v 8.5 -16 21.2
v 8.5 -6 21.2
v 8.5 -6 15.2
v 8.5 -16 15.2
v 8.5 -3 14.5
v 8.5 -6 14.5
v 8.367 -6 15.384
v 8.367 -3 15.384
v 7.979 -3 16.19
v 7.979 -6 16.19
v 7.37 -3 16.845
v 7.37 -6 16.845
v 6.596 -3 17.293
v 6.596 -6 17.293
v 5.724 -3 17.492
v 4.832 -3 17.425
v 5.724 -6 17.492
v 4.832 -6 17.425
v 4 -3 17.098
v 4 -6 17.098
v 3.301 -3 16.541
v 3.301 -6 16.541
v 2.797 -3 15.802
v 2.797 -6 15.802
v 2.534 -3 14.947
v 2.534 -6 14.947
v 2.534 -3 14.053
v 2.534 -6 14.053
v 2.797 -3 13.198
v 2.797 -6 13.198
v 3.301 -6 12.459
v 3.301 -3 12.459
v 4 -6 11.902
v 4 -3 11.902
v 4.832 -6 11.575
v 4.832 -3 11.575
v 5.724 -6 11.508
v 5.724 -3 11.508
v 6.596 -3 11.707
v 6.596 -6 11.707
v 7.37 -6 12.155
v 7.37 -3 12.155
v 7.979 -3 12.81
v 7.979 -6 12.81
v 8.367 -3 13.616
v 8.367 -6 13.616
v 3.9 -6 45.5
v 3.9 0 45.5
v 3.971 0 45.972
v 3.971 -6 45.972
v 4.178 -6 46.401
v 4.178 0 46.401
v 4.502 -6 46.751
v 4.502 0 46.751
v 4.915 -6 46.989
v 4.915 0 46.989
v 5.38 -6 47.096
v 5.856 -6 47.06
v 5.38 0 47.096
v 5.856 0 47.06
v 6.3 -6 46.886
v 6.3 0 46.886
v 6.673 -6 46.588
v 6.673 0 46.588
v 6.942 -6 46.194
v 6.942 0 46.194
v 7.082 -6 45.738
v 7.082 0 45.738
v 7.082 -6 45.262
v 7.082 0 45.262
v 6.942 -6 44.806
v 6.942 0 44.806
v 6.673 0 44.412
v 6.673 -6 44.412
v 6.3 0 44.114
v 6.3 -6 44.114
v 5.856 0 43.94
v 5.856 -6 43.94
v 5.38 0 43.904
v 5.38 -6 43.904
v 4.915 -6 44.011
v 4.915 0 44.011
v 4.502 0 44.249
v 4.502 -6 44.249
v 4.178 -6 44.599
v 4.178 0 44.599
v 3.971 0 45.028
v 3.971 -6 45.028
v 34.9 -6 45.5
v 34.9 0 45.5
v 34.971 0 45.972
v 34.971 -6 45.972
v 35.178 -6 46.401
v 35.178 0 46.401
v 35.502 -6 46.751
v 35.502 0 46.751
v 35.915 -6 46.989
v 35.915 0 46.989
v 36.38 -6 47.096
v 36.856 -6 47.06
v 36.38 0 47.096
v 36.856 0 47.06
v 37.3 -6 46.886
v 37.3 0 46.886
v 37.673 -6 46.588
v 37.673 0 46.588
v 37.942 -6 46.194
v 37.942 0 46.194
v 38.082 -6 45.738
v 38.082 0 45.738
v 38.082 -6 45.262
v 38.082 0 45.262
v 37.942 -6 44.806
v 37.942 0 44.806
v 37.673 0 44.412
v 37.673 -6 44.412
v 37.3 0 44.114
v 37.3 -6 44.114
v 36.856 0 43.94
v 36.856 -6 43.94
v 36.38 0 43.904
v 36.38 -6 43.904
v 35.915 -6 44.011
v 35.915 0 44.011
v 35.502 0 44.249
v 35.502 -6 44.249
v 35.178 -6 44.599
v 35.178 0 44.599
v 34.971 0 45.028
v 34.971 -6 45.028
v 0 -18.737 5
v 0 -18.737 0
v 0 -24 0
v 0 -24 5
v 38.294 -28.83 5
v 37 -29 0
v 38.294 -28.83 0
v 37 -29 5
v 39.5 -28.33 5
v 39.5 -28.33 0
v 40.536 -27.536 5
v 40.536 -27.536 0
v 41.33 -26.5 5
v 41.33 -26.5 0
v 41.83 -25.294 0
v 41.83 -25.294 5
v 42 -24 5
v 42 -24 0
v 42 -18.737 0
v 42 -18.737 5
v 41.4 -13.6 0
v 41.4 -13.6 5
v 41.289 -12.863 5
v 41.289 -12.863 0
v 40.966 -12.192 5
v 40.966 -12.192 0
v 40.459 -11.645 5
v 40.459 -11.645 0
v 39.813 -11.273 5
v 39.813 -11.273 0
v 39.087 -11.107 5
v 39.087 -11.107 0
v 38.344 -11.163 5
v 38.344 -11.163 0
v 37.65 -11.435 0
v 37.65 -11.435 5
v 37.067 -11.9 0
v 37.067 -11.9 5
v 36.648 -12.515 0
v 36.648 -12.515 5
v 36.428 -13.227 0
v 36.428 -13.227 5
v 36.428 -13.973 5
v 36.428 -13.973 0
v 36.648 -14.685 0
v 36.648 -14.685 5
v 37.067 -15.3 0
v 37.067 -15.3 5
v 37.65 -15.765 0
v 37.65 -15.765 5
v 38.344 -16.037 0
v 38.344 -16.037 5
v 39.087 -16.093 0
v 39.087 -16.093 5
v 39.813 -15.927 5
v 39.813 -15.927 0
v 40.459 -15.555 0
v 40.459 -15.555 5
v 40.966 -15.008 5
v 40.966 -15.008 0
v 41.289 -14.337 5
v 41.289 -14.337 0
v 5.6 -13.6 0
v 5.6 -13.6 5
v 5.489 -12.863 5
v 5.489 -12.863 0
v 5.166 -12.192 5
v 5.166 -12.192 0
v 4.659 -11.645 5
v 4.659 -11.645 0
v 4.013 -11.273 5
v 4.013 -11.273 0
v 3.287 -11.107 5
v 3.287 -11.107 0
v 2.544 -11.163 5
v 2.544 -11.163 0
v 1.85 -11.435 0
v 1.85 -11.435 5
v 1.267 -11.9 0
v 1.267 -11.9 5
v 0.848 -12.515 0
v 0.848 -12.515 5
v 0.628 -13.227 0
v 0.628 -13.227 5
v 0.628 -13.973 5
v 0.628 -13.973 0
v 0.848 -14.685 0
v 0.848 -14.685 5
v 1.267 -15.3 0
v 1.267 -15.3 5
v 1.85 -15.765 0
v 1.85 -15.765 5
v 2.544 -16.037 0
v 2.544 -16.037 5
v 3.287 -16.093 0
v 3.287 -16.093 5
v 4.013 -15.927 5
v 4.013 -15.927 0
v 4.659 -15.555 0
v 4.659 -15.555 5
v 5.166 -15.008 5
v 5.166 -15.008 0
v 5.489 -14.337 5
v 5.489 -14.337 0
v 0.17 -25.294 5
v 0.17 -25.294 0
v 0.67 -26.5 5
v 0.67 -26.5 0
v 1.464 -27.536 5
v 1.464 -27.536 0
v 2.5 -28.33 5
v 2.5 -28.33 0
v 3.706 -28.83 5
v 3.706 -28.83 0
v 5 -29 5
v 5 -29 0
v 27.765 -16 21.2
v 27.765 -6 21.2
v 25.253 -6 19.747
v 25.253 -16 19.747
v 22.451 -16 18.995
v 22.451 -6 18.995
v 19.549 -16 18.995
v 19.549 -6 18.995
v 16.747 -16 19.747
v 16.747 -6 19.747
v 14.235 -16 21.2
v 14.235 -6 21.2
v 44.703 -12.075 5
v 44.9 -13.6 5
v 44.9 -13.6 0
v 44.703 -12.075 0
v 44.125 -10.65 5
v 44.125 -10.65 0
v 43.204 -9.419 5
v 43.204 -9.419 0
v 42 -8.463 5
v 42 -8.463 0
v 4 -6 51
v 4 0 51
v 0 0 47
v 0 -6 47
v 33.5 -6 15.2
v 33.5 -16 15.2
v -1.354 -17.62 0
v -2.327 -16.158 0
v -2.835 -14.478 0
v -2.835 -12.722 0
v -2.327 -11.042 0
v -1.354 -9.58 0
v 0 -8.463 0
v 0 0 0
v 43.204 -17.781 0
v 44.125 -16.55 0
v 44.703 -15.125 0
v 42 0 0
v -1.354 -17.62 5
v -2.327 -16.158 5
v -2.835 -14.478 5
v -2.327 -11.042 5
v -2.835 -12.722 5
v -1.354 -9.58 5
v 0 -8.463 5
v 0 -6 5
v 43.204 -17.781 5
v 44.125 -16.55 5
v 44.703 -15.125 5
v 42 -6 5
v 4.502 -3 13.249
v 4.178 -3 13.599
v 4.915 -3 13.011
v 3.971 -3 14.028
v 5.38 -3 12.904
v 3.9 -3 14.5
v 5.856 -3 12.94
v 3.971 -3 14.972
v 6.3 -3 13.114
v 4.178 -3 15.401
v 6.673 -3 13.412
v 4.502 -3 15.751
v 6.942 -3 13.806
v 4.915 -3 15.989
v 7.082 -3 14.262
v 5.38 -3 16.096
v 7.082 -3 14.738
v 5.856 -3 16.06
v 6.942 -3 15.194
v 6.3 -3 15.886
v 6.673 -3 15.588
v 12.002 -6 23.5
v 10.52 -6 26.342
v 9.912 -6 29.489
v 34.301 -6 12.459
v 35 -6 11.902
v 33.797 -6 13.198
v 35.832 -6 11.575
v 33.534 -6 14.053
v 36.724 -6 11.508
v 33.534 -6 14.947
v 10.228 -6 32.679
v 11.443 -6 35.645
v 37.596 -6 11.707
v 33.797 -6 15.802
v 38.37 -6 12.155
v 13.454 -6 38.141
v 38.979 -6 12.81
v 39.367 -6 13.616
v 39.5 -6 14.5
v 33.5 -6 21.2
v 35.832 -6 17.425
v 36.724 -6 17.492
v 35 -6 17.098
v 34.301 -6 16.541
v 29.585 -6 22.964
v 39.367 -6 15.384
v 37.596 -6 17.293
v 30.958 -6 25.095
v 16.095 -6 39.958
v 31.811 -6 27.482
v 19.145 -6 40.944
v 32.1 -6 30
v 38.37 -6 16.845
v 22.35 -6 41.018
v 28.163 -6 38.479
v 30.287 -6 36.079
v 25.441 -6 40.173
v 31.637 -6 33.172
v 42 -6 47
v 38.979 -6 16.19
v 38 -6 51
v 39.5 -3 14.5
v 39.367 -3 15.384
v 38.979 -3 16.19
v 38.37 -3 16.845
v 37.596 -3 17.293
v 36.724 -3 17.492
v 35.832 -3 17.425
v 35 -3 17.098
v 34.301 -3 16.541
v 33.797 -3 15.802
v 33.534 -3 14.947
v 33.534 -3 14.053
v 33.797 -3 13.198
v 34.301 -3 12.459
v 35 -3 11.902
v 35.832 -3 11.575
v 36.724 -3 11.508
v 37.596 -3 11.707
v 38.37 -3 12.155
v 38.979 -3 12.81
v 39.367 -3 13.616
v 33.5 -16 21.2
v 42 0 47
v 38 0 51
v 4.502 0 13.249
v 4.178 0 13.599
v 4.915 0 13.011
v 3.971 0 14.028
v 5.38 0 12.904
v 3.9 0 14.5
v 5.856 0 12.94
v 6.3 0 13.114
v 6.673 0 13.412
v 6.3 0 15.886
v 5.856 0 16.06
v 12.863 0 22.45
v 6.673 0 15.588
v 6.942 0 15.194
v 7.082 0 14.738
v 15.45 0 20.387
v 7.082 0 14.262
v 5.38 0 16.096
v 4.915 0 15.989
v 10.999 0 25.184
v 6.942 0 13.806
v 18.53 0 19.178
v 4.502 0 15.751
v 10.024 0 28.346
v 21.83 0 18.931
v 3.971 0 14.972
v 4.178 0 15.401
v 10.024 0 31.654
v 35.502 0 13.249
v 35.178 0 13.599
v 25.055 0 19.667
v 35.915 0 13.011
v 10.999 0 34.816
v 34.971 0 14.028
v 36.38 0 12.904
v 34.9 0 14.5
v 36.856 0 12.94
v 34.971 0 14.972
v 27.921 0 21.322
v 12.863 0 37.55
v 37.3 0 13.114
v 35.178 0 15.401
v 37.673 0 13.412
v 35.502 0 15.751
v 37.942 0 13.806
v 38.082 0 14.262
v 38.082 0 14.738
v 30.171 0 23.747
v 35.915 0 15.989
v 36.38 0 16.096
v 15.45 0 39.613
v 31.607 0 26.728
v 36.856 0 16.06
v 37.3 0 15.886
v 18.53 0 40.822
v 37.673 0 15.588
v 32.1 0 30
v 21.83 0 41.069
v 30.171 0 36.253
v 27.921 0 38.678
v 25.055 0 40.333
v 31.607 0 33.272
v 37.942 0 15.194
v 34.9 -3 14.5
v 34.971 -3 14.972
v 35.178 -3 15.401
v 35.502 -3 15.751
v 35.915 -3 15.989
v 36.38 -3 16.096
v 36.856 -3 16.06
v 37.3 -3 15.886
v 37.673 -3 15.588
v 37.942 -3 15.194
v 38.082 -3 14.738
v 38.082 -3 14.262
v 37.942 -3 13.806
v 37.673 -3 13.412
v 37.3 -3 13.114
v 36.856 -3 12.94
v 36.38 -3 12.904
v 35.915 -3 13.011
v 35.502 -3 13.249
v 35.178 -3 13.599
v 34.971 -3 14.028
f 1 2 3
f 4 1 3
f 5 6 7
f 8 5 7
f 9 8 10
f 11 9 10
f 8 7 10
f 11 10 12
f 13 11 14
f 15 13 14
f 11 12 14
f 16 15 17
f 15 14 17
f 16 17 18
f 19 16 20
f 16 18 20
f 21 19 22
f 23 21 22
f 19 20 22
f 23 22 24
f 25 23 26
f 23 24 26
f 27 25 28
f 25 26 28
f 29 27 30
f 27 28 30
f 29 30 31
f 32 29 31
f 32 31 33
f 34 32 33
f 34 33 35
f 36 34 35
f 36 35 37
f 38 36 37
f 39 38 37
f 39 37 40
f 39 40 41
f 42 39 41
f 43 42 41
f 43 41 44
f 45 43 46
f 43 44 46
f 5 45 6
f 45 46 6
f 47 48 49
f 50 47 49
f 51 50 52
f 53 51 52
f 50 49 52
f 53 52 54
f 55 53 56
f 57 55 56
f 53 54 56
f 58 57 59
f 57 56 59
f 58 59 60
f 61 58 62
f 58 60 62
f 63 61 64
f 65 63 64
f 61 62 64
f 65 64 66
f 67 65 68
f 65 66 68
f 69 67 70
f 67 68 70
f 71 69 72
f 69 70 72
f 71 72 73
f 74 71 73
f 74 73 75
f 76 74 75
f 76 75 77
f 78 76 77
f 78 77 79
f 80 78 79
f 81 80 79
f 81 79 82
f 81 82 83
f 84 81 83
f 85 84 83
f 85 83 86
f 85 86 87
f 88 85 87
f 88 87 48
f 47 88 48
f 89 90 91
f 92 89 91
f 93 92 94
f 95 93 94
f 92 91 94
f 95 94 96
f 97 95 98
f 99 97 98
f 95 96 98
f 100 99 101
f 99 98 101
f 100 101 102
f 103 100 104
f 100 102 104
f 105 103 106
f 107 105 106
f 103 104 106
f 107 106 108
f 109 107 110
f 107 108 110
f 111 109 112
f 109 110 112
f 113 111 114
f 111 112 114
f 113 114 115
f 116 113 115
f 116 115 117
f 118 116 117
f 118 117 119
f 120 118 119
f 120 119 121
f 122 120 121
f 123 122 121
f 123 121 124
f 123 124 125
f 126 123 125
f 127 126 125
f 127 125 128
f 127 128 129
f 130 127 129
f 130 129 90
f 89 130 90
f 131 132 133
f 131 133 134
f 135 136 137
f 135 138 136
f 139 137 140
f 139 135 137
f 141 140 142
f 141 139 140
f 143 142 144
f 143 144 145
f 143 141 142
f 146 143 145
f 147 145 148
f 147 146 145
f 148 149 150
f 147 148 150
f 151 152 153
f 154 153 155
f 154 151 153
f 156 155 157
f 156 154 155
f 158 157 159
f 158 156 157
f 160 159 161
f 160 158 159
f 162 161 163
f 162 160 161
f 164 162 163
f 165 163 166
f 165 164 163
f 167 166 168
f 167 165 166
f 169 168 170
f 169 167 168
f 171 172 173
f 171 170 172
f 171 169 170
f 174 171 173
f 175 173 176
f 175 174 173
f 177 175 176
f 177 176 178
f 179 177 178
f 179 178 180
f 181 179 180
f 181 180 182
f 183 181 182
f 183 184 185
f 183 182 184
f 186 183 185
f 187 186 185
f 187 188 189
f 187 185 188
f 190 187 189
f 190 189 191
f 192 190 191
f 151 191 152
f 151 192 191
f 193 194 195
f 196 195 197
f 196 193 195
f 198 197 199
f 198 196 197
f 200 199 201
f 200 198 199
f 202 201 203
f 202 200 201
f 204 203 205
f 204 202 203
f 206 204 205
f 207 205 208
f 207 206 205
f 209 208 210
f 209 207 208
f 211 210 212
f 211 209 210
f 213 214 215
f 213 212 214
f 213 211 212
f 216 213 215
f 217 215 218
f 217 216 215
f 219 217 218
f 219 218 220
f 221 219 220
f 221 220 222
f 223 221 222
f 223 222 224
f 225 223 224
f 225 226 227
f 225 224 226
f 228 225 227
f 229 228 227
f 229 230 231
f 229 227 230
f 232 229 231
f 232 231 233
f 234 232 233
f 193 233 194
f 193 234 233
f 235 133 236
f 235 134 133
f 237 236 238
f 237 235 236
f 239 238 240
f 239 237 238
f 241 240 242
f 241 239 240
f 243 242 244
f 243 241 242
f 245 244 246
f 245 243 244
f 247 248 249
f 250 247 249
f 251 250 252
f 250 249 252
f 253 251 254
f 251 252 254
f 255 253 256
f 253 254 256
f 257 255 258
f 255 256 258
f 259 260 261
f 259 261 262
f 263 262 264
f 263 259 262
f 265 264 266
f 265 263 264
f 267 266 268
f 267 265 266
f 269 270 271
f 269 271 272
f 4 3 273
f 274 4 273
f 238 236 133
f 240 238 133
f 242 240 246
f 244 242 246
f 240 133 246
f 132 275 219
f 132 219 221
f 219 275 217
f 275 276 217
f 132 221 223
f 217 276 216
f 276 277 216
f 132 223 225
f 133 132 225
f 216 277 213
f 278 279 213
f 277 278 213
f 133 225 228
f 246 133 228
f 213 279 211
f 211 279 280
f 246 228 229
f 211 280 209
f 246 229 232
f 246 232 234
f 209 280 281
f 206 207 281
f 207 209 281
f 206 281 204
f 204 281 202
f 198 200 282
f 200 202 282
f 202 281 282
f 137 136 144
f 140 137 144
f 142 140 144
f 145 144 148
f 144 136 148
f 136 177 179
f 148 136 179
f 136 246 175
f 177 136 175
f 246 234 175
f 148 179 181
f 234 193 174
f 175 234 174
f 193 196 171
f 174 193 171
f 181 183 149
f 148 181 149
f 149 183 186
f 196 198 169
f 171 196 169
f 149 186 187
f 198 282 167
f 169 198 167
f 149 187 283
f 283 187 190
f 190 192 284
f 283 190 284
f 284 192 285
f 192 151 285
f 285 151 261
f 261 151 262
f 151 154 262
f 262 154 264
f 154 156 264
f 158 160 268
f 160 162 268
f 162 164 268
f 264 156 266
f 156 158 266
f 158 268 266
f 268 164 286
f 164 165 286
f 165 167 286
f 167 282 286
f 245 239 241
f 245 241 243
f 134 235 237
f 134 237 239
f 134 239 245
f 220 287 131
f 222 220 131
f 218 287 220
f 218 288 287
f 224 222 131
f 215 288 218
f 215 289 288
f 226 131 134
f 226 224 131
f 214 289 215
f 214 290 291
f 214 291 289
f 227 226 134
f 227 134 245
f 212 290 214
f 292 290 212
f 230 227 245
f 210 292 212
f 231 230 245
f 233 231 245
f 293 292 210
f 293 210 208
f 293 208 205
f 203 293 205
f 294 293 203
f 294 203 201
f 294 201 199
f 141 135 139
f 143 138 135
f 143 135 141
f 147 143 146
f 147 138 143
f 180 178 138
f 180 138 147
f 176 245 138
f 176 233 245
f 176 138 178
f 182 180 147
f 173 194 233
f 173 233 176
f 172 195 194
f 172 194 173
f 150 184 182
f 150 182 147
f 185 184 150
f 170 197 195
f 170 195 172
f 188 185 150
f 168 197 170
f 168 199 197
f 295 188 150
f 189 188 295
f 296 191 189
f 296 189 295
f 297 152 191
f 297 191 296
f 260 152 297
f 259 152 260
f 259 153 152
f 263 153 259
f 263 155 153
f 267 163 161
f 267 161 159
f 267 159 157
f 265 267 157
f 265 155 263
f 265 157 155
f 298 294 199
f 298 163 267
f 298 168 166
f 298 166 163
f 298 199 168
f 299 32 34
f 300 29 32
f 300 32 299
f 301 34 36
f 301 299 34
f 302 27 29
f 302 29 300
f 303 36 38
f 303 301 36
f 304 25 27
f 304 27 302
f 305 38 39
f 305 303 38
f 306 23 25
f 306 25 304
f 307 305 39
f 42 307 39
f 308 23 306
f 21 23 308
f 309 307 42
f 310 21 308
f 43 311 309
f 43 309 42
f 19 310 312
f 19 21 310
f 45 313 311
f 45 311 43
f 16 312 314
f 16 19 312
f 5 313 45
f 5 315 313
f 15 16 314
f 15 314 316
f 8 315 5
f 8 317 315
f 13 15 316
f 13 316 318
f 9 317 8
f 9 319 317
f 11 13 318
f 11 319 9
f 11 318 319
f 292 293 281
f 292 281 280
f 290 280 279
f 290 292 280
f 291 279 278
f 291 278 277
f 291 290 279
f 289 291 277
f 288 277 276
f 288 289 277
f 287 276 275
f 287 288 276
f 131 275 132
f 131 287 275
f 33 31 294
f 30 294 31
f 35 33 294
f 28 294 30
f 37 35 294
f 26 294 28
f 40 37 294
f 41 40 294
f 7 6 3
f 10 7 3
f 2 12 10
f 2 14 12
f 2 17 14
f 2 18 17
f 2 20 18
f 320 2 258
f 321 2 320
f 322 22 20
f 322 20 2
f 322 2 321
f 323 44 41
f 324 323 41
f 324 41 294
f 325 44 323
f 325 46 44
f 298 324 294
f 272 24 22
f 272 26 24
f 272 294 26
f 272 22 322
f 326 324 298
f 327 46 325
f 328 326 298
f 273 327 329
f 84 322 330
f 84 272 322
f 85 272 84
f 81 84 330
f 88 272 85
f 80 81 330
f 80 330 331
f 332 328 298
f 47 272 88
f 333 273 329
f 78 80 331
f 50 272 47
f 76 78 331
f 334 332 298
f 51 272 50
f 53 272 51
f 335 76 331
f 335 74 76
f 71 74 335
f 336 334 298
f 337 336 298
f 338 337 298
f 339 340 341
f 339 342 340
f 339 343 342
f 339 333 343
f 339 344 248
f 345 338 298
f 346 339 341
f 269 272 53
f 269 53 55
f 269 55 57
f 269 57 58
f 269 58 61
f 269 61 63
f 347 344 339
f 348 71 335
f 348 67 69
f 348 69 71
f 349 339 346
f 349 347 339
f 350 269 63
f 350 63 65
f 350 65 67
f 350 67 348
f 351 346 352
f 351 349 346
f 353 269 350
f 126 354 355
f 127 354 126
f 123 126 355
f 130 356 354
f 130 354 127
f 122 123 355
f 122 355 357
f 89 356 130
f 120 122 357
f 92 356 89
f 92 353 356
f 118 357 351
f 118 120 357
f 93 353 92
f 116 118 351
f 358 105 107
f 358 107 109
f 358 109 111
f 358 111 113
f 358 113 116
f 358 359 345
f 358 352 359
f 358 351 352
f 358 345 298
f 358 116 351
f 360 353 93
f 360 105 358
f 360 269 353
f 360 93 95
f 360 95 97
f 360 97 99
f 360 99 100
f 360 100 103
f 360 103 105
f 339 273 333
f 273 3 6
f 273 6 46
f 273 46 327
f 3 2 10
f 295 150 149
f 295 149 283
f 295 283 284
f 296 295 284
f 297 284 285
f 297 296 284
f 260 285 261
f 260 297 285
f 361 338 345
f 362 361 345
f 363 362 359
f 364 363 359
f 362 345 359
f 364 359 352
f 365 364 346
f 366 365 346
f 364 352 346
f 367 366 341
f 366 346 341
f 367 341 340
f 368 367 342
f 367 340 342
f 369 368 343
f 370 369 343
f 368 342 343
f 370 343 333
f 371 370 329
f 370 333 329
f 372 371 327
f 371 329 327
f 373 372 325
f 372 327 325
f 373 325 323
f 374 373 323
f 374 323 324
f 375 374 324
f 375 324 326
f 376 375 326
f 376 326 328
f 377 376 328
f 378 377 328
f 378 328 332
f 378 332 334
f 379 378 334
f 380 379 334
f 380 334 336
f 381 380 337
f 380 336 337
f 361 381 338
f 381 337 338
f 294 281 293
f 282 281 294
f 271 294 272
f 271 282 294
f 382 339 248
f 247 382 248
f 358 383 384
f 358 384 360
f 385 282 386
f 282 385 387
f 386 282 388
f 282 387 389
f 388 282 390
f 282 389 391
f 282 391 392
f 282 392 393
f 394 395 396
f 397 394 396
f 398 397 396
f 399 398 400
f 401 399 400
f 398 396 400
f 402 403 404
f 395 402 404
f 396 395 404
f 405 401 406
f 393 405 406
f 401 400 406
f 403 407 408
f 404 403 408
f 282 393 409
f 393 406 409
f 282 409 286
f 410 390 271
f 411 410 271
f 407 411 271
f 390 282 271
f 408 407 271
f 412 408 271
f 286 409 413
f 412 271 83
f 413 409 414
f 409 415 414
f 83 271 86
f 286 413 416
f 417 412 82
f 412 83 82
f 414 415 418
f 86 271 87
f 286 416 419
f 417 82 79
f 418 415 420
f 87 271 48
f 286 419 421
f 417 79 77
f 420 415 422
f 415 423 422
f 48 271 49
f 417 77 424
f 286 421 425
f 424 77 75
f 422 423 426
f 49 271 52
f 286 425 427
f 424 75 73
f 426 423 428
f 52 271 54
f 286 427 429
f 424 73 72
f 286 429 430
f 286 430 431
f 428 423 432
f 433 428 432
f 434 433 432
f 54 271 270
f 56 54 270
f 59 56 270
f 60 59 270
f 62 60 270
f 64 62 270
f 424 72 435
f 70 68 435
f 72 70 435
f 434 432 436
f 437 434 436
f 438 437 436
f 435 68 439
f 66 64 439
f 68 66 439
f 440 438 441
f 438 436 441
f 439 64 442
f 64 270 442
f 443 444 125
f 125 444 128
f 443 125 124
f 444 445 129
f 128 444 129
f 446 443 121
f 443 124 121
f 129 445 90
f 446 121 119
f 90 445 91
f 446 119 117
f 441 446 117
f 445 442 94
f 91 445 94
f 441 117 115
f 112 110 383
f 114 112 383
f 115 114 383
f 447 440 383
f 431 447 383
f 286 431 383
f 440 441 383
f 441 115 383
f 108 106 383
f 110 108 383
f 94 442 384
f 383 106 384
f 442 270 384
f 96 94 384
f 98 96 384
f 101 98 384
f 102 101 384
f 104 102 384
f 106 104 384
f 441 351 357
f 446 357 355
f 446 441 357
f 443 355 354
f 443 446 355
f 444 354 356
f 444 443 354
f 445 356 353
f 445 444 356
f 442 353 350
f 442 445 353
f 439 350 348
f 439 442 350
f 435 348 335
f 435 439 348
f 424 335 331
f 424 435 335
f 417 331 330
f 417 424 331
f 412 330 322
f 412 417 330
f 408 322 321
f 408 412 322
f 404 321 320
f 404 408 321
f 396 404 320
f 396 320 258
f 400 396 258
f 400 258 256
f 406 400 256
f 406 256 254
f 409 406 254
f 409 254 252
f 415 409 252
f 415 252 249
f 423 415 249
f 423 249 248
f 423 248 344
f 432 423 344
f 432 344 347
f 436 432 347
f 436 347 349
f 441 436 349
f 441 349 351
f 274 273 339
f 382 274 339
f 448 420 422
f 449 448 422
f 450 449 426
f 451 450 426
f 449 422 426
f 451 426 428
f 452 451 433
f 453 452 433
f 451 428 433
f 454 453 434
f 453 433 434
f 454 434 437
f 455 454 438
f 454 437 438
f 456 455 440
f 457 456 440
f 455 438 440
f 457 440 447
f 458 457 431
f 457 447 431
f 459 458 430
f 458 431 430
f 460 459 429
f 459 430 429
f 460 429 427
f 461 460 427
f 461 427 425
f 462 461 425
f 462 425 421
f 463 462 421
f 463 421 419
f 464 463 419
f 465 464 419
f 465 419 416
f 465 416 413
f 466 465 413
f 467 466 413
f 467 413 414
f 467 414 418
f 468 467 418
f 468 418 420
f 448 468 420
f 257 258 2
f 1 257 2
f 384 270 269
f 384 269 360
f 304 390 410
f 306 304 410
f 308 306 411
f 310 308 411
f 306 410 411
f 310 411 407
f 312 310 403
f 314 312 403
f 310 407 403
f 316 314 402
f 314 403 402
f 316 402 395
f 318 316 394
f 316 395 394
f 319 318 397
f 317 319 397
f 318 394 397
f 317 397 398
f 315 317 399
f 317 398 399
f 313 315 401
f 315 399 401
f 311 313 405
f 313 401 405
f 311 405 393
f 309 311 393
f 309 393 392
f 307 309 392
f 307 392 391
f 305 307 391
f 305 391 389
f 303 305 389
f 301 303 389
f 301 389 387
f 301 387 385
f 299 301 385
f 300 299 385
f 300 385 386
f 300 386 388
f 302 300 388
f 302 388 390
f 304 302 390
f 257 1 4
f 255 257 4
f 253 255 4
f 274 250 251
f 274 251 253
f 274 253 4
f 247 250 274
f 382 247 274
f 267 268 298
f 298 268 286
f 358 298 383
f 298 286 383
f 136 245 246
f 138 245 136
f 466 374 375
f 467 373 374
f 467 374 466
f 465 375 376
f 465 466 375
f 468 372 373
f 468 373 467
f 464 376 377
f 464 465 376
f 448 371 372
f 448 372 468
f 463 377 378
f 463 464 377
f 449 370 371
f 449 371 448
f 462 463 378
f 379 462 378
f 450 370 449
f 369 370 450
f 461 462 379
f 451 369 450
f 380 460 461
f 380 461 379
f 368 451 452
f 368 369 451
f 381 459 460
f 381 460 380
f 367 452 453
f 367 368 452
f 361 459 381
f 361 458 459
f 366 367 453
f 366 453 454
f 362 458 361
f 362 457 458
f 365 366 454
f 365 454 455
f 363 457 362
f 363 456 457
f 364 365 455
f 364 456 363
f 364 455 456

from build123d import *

# Parameters (mm, degrees)
F0_W      = 42
F0_H      = 51
F0_R      = 11.1
F1_DEPTH  = 6
F2_SIZE   = 4
F3_W      = 42
F3_H      = 5
F4_DEPTH  = 23
F6_DEPTH  = 10
F7_R      = 1.6
F8_DEPTH  = 25
F9_R      = 2.5
F10_DEPTH = 6
F11_R     = 3
F12_DEPTH = 3
F14_DEPTH = 5
F15_R     = 5


with BuildPart() as f1:
    # F0 (on Front) → F1 (new body)
    with BuildSketch(Plane.XZ):
        with Locations((21, 25.5)):
            Rectangle(F0_W, F0_H)
        with Locations((21, 30)):
            Circle(F0_R, mode=Mode.SUBTRACT)
    extrude(amount=F1_DEPTH)

    # F2
    f2_edges = [f1.edges().sort_by_distance(p)[0] for p in [
        (0, -3, 51),
        (42, -3, 51),
    ]]
    chamfer(f2_edges, length=F2_SIZE)

    # F3 (on face) → F4 (join)
    with BuildSketch(Plane.XZ.offset(6)):
        with Locations((21, 2.5)):
            Rectangle(F3_W, F3_H)
    extrude(amount=F4_DEPTH)

    # F5 (on face) → F6 (join)
    with BuildSketch(Plane.XZ.offset(6)):
        with BuildLine():
            Line((14.2346470898, 21.2), (8.5, 21.2))
            Line((8.5, 21.2), (8.5, 15.2))
            Line((8.5, 15.2), (33.5, 15.2))
            Line((33.5, 15.2), (33.5, 21.2))
            Line((33.5, 21.2), (27.7653529102, 21.2))
            ThreePointArc((27.7653529102, 21.2), (21, 18.9), (14.2346470898, 21.2))
        make_face()
    extrude(amount=F6_DEPTH)

    # F7 (on face) → F8 (cut)
    with BuildSketch(Plane(origin=(0, 0, 0), x_dir=(-1, 0, 0), z_dir=(0, 1, 0))):
        with Locations((-36.5, 45.5)):
            Circle(F7_R)
        with Locations((-5.5, 45.5)):
            Circle(F7_R)
        with Locations((-5.5, 14.5)):
            Circle(F7_R)
        with Locations((-36.5, 14.5)):
            Circle(F7_R)
    extrude(amount=-F8_DEPTH, mode=Mode.SUBTRACT)

    # F9 (on Top) → F10 (cut)
    with BuildSketch(Plane.XY):
        with Locations((3.1, -13.6)):
            Circle(F9_R)
        with Locations((38.9, -13.6)):
            Circle(F9_R)
    extrude(amount=F10_DEPTH, mode=Mode.SUBTRACT)

    # F11 (on face) → F12 (cut)
    with BuildSketch(Plane.XZ.offset(6)):
        with Locations((5.5, 14.5)):
            Circle(F11_R)
        with Locations((36.5, 14.5)):
            Circle(F11_R)
    extrude(amount=-F12_DEPTH, mode=Mode.SUBTRACT)

    # F13 (on face) → F14 (join)
    with BuildSketch(Plane.XY.offset(5)):
        with BuildLine():
            Line((0, -18.7371198156), (0, -8.4628801844))
            ThreePointArc((0, -8.4628801844), (-2.9, -13.6), (0, -18.7371198156))
        make_face()
        with BuildLine():
            ThreePointArc((44.9, -13.6), (44.124940191, -10.6504237592), (42, -8.4628801844))
            Line((42, -8.4628801844), (42, -18.7371198156))
            ThreePointArc((42, -18.7371198156), (44.124940191, -16.5495762408), (44.9, -13.6))
        make_face()
    extrude(amount=-F14_DEPTH)

    # F15
    f15_edges = [f1.edges().sort_by_distance(p)[0] for p in [
        (0, -29, 2.5),
        (42, -29, 2.5),
    ]]
    fillet(f15_edges, radius=F15_R)


solid = f1.part
